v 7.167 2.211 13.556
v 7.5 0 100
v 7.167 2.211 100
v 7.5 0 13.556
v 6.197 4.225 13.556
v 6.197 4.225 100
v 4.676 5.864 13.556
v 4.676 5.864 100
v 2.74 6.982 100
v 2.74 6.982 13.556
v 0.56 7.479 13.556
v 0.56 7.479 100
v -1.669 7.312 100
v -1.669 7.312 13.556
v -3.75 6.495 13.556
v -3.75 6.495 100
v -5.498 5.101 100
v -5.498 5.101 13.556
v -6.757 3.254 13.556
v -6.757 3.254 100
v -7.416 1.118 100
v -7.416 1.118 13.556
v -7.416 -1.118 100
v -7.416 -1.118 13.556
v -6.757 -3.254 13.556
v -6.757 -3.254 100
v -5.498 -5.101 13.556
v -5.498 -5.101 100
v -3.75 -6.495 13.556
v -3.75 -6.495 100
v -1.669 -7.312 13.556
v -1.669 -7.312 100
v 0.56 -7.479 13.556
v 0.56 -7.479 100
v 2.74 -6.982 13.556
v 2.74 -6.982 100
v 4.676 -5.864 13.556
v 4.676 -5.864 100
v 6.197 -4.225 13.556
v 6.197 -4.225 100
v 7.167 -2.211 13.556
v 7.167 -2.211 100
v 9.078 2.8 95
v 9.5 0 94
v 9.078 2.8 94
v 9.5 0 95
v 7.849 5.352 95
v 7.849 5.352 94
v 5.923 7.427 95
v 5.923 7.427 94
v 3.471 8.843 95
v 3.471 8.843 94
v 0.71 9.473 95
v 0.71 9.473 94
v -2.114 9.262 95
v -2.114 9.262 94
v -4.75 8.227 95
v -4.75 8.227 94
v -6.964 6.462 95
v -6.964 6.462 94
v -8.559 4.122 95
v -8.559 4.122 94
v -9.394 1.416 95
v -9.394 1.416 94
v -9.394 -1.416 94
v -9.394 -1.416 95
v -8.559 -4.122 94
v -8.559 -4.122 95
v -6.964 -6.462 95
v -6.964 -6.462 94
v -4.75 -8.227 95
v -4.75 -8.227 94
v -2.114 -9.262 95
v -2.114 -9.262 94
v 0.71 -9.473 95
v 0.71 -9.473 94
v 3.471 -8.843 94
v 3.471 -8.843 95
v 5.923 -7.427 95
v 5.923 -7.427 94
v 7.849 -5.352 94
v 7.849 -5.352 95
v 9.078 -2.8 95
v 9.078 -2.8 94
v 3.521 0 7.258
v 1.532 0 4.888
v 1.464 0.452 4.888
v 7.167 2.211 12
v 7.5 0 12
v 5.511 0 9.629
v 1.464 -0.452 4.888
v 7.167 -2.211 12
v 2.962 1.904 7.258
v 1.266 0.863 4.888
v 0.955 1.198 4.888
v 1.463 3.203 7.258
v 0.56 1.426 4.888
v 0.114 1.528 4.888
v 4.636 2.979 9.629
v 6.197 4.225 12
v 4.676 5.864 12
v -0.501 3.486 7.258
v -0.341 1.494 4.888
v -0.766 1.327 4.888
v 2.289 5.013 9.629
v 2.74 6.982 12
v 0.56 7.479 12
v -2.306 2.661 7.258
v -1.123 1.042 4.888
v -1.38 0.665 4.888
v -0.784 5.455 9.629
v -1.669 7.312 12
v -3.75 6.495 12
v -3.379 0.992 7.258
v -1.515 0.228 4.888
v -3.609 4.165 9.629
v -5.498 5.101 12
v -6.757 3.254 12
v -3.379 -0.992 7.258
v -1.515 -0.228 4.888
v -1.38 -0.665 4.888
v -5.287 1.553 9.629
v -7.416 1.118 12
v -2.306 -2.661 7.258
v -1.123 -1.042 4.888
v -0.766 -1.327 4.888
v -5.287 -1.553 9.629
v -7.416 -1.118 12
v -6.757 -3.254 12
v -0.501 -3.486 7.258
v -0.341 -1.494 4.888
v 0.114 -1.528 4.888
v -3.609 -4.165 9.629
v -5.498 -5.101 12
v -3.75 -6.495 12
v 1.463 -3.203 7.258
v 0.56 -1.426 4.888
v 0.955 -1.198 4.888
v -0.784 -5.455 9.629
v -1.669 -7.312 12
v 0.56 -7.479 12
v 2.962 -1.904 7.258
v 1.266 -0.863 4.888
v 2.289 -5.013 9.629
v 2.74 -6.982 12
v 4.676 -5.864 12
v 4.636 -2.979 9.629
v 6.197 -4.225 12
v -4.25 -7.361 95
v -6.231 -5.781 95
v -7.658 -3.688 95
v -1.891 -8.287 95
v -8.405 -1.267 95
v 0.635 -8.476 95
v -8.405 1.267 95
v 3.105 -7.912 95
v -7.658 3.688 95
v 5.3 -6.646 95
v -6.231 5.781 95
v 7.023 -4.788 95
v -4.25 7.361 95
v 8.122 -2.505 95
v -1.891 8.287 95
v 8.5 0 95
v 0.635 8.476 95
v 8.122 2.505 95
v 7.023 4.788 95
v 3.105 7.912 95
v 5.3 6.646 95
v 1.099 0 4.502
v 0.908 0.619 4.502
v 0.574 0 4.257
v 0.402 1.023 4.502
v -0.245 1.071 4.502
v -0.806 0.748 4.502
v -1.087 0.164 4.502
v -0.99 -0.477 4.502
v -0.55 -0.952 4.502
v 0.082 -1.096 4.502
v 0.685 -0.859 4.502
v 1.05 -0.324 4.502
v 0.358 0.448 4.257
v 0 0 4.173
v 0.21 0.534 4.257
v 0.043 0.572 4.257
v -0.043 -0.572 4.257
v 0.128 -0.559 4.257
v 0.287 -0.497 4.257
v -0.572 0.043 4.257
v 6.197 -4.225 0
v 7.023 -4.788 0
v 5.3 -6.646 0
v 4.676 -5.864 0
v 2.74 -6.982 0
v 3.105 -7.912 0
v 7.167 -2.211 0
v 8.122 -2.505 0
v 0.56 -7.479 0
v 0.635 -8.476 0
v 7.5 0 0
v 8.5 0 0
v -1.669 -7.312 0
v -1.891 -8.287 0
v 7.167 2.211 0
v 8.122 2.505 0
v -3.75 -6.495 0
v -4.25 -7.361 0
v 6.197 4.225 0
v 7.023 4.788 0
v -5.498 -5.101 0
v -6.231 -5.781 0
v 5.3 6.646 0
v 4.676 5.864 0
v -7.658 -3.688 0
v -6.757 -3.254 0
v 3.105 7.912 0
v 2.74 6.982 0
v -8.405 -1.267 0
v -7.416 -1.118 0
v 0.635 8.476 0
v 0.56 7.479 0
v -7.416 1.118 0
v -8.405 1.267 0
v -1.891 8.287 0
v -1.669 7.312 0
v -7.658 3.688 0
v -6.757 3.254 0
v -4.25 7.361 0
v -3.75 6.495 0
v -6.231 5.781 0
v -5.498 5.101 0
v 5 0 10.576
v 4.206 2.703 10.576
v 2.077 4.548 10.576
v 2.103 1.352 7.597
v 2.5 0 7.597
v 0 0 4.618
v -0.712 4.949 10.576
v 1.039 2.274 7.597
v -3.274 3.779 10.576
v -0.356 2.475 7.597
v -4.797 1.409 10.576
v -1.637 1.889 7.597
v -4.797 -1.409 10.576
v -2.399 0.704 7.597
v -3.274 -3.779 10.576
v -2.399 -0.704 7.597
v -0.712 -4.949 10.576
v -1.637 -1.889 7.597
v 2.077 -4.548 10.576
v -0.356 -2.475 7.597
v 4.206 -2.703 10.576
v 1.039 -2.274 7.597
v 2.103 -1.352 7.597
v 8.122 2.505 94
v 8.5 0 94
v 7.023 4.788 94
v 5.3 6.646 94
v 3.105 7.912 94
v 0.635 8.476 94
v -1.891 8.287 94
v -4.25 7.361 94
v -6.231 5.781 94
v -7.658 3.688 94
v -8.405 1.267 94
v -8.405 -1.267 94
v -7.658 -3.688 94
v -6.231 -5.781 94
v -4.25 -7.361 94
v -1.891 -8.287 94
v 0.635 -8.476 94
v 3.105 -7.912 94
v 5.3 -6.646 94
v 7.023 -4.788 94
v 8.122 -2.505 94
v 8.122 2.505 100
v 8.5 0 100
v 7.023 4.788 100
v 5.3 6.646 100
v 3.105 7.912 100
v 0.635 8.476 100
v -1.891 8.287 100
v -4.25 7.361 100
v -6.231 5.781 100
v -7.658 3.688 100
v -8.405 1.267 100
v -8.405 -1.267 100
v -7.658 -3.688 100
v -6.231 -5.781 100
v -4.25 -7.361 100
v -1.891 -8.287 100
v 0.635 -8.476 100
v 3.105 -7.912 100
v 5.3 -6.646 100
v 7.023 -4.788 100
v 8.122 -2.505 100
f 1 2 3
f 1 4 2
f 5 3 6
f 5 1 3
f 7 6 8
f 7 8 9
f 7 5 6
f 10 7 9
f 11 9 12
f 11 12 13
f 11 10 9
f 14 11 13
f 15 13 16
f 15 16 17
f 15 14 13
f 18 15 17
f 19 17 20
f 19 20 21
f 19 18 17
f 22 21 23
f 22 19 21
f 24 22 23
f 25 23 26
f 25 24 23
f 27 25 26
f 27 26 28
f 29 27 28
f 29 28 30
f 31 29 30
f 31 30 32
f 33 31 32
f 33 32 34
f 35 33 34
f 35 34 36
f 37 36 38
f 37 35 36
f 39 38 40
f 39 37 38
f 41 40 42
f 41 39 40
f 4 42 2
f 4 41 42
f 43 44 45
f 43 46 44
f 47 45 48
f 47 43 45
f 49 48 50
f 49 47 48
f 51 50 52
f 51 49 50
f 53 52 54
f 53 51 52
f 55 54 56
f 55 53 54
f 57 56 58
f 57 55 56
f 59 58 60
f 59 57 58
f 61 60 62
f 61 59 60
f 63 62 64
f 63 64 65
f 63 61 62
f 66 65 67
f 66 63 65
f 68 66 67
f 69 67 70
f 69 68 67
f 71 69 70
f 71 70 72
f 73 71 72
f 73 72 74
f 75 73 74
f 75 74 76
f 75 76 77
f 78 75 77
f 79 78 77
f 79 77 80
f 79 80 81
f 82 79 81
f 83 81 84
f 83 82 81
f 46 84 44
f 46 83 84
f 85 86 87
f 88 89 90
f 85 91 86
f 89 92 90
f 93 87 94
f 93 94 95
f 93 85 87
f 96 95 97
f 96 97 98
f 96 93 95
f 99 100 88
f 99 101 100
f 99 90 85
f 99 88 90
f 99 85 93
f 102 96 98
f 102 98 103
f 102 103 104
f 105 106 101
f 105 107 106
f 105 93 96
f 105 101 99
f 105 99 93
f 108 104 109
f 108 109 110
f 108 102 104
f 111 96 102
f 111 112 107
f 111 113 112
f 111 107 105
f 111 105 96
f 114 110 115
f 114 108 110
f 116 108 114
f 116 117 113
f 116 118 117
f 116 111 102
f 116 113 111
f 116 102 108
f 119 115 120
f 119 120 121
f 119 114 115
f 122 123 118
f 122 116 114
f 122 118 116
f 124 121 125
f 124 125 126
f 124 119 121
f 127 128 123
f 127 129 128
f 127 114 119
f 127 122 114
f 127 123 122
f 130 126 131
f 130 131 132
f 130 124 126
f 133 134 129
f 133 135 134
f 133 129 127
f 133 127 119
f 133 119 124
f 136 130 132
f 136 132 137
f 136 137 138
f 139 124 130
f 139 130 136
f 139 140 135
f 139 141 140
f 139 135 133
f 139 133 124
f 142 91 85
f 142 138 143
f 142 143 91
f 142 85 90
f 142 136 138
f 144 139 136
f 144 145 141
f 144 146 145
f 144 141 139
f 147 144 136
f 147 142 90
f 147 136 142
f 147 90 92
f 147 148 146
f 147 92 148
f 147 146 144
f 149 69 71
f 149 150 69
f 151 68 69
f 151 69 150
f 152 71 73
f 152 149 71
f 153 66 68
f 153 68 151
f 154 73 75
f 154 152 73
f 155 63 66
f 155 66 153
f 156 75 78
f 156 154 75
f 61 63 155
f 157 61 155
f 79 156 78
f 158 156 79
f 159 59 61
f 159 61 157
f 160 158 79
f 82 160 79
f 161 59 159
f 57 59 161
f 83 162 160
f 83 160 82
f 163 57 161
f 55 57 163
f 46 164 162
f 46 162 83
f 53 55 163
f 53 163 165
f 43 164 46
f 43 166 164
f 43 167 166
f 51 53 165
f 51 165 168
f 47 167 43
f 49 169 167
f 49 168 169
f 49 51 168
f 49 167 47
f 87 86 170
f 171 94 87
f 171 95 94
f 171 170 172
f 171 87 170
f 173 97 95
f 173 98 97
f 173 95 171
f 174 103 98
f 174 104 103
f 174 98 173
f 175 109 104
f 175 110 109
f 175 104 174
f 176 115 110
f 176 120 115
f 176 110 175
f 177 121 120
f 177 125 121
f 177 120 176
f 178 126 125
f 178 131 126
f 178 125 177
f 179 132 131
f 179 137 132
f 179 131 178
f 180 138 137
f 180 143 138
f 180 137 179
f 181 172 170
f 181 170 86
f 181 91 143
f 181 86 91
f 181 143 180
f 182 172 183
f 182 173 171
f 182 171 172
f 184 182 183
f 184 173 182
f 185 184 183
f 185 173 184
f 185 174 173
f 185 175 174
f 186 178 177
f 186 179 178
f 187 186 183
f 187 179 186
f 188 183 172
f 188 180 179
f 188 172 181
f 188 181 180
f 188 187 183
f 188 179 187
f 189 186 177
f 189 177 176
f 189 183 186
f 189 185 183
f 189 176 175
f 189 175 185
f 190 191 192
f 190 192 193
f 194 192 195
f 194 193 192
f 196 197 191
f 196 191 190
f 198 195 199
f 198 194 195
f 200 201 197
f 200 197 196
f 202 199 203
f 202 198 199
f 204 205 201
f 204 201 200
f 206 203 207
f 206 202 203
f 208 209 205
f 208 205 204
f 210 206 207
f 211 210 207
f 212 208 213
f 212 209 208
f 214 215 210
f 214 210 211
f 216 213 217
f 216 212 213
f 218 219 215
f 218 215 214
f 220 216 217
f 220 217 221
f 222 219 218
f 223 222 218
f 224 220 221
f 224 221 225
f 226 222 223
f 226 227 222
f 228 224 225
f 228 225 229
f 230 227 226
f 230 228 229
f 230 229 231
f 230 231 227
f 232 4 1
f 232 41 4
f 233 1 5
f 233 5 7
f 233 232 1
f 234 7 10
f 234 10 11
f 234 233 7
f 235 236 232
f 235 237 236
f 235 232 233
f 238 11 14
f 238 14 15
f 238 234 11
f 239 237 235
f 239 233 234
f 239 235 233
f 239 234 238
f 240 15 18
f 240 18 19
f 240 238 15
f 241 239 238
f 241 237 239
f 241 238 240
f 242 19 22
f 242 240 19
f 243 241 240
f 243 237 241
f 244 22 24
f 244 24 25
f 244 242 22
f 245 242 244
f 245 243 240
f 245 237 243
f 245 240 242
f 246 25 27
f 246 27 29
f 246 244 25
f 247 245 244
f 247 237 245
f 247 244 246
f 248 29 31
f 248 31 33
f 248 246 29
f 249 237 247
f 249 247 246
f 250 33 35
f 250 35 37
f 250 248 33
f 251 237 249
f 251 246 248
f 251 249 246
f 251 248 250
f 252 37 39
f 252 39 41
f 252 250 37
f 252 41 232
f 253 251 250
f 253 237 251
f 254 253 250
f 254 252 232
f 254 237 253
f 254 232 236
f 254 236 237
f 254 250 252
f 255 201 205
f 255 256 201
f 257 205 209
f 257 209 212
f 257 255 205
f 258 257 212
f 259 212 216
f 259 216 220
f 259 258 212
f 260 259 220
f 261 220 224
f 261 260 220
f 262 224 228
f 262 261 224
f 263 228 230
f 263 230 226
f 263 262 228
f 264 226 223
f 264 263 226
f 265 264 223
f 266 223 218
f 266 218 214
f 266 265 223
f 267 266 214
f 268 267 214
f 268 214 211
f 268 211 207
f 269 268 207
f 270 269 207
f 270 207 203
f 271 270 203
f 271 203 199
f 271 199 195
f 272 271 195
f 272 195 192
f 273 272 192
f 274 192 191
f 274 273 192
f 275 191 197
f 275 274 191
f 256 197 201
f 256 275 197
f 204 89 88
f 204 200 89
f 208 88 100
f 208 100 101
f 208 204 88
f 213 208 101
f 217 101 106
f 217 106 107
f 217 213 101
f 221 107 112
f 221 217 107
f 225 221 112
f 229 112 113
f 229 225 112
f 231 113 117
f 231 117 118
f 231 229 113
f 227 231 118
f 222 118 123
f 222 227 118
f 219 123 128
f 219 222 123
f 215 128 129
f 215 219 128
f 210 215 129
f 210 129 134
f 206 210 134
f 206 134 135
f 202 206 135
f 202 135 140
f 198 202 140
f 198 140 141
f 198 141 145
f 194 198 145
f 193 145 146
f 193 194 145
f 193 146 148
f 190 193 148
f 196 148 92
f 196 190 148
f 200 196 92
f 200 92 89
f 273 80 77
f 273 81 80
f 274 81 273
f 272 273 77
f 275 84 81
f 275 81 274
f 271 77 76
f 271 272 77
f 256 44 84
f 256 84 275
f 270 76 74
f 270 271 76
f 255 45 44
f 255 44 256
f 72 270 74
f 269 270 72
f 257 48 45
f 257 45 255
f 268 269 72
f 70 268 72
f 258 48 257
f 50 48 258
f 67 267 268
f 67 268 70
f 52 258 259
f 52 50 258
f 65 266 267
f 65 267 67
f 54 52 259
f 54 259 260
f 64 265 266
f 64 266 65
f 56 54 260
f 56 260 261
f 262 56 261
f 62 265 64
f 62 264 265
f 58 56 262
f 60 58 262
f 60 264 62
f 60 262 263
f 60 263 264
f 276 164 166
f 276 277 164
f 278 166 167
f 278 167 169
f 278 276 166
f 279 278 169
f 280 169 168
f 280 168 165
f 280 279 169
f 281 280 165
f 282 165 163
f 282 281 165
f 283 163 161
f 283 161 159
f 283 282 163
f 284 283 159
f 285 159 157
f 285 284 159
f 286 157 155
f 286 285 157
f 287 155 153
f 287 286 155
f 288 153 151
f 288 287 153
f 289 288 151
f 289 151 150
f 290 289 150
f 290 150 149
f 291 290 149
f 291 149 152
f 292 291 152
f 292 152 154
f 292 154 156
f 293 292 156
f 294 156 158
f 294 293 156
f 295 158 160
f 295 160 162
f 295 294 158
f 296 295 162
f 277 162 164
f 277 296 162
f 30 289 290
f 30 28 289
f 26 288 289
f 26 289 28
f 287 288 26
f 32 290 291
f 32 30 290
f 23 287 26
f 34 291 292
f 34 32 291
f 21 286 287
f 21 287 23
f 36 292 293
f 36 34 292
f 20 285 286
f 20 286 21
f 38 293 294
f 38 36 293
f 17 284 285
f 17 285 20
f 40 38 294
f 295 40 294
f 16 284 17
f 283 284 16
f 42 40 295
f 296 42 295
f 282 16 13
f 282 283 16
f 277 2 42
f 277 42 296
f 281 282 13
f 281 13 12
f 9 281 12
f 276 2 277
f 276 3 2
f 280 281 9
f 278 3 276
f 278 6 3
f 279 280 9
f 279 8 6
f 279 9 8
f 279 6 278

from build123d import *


with BuildPart() as part:
    # Sketch → Revolution (revolve)
    with BuildSketch(Plane.XZ):
        with BuildLine():
            Line((8.5, 94), (9.5, 94))
            Line((9.5, 94), (9.5, 95))
            Line((9.5, 95), (8.5, 95))
            Line((8.5, 95), (8.5, 100))
            Line((8.5, 100), (7.5, 100))
            Line((7.5, 100), (7.5, 13.555724))
            Line((7.5, 13.555724), (0, 4.617572))
            Line((0, 4.173296), (0, 4.617572))
            ThreePointArc((0, 4.173296), (0.845237, 4.36068), (1.532089, 4.88772))
            Line((1.532089, 4.88772), (7.5, 12))
            Line((7.5, 12), (7.5, 0))
            Line((7.5, 0), (8.5, 0))
            Line((8.5, 0), (8.5, 94))
        make_face()
    revolve(axis=Axis((0, 0, 0), (0, 0, 1)))


solid = part.part
